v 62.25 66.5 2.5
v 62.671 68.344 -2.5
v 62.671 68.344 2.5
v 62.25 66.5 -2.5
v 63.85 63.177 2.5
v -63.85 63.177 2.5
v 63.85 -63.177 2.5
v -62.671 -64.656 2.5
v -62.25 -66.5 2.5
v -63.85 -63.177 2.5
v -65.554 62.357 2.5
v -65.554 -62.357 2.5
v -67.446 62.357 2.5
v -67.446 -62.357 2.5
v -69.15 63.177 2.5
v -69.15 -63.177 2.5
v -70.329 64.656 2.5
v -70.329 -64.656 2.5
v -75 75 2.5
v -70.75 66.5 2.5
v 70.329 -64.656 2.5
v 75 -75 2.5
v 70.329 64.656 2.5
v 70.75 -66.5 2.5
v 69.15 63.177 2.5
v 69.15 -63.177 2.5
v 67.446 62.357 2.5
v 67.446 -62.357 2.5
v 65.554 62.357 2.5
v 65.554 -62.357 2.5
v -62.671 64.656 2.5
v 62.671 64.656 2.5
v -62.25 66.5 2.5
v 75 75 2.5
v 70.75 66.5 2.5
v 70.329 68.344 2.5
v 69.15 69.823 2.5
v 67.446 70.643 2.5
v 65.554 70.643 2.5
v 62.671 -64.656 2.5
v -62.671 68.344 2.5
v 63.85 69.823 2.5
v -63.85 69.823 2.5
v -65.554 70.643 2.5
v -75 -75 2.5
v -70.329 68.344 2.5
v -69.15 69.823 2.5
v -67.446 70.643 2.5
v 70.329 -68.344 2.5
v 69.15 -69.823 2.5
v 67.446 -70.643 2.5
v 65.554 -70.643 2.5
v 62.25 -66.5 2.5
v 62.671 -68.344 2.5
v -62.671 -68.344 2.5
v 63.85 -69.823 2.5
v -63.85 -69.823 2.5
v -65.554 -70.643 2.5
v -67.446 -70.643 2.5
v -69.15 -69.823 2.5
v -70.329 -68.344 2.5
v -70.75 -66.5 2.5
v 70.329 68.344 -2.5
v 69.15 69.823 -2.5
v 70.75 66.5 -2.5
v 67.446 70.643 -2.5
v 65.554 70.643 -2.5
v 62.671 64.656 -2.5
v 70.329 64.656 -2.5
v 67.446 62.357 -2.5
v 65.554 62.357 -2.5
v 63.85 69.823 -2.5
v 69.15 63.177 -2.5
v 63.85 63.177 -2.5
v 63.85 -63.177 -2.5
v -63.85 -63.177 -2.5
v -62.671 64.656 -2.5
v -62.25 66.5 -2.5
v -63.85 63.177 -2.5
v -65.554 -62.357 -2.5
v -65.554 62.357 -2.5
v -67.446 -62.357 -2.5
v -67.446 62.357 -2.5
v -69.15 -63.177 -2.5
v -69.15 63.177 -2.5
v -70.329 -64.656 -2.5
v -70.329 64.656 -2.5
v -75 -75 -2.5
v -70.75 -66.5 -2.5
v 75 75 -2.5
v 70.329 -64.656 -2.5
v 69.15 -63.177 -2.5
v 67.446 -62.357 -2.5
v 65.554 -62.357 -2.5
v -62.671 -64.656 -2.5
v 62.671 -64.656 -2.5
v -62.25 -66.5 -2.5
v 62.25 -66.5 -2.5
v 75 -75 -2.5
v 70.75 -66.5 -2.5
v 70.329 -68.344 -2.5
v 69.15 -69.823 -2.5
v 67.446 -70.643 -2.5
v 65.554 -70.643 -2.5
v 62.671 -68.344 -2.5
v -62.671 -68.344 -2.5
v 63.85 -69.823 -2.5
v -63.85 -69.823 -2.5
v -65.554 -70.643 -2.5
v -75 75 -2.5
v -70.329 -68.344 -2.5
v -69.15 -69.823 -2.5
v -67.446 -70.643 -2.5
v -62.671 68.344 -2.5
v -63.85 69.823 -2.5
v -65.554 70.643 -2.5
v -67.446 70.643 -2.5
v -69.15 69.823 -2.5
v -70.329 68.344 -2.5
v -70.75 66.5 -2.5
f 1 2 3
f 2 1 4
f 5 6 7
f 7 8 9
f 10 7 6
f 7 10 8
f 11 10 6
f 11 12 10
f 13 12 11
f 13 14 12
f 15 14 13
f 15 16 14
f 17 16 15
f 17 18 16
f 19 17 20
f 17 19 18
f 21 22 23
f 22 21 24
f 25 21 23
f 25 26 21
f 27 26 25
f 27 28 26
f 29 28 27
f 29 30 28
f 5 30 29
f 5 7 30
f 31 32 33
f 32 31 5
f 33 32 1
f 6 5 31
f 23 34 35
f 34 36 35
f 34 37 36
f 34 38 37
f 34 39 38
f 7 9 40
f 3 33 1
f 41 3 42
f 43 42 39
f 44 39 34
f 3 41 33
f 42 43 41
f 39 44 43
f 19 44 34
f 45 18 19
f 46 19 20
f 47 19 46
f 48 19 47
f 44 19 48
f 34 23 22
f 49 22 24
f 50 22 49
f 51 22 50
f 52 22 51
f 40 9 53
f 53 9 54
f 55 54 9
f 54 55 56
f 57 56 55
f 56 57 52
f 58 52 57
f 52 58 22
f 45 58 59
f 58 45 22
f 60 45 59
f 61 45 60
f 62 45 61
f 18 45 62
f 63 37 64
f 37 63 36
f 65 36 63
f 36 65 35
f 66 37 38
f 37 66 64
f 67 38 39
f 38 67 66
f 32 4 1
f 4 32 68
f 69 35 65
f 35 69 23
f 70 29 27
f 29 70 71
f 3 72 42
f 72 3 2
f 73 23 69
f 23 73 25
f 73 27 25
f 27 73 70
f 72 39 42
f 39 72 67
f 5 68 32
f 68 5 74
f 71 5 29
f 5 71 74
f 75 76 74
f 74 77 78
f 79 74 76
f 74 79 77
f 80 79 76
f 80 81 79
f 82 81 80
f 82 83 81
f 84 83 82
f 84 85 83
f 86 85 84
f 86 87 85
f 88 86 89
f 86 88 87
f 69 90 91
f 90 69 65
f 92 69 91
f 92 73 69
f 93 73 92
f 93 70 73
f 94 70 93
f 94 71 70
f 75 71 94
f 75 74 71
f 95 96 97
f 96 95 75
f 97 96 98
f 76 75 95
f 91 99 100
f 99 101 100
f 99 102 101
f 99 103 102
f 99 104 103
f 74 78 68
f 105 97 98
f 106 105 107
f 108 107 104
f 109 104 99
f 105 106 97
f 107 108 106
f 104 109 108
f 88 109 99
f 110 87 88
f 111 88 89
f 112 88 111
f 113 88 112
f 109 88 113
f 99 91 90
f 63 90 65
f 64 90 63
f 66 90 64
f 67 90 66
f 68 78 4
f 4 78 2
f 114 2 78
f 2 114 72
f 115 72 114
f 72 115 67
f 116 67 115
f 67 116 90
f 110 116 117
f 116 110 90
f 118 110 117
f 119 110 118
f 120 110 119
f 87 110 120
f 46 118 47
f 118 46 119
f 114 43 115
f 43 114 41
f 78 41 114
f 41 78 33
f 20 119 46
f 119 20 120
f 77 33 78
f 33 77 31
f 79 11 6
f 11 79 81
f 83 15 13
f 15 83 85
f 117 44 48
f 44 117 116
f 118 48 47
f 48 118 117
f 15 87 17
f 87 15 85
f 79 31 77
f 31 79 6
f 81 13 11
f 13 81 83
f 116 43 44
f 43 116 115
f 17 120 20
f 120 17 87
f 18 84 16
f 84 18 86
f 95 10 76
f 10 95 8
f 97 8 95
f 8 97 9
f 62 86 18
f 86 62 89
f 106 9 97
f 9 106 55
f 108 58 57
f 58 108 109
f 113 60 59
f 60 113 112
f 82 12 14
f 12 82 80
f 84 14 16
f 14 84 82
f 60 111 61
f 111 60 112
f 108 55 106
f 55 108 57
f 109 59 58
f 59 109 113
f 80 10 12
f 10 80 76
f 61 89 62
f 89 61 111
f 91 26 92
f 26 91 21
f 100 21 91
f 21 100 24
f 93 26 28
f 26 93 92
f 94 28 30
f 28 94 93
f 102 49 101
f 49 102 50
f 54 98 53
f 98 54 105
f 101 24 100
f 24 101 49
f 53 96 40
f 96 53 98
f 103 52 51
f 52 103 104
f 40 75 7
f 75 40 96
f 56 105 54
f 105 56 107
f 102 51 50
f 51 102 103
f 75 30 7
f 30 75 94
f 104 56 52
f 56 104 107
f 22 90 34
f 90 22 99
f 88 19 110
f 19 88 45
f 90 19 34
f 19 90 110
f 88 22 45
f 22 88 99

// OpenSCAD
// Generated by SolidPython 1.1.3 on 2024-05-08 19:40:10


difference() {
	cube(center = true, size = [150, 150, 5]);
	union() {
		translate(v = [66.5000000000, 66.5000000000]) {
			cylinder(center = true, h = 5, r = 4.2500000000);
		}
		translate(v = [-66.5000000000, 66.5000000000]) {
			cylinder(center = true, h = 5, r = 4.2500000000);
		}
		translate(v = [-66.5000000000, -66.5000000000]) {
			cylinder(center = true, h = 5, r = 4.2500000000);
		}
		translate(v = [66.5000000000, -66.5000000000]) {
			cylinder(center = true, h = 5, r = 4.2500000000);
		}
	}
}
/***********************************************
*********      SolidPython code:      **********
************************************************
 
import solid
import numpy as np
import numbers
import pudb
from solid.utils import *
import viewscad
import subprocess
import os
import os.path as osp
import math
import sys

chamfer_extrude=solid.import_scad("./chamfer_extrude.scad")
chamfer_extrude=chamfer_extrude.chamfer_extrude
r = viewscad.Renderer(width=800, height=800)

def debug(model,f_name,path="/home/ts/code/projects/mfd/designs/debug"):
    solid.scad_render_to_file(model,osp.join(path,f_name)+".scad")
#generate position list of wells using offset from center
wells_pos_from_center_4 = lambda offset: [[-offset,offset],
                                        [offset, offset],
                                        [-offset, -offset],
                                        [offset, -offset]]
wells_pos_from_center_2 = lambda offset: [[offset,0],
                                        [-offset,0]]

def make_well(dims,shape=None,height=None,dxf=False):
    def circle_cylinder():
        if dxf or (height is None):
            well = solid.circle(r=dims, segments=64)
        else:
            well = solid.cylinder(r=dims, h=height, segments=64, center = True)
        return well
    if dims is None:
        sys.exit("radius needs to be a number")
    if isinstance(dims, numbers.Number):
        well =circle_cylinder()
    elif len(dims)==1:
        if isinstance(dims[1], numbers.Number):
            well =circle_cylinder()
        else:
            sys.exit("radius needs to be a number")
    elif len(dims)==2:
        well = solid.square(dims,center = True)
    elif len(dims)==3:
        well = solid.cube(dims, center = True)
    return well

def wells_top_bottom(center_gap,device_dims=None,shape=None,height=None, positions = None, dxf = False,well_shape=None):
    if well_shape == None:
        well_shape = make_well(device_dims,shape=shape,height=height,dxf=dxf)
    wells = []
    if positions is None:
        offset = radius+radius/2.0
        positions = wells_pos_from_center_2(offset)
    if dxf or (height is None):
        height = 0
    for position in positions:
        if dxf:
            wells.append(solid.translate([position[0],position[1]])(well_shape))
        else:
            wells.append(solid.translate([position[0],position[1],height/2.0])(well_shape))
    return  union()(*wells)

#place wells in four corners 
def four_corner(radius,height=None, positions = None, dxf = False):
    #if well pos not specified set
    #to equally spaced by half radius
    if positions is None:
        offset = radius+radius/2.0
        positions = wells_pos_from_center_4(offset)
    if dxf or (height is None):
        height = 0
    #make wells at positions with specified radius and height
    wells = []
    for position in positions:
        #make circle if making dxf
        if dxf:
            well_shape = solid.circle(r=radius, segments=64)
            well_shape = solid.translate([position[0],position[1]])(well_shape)
        #if stl make cylinder
        else:
            well_shape = solid.cylinder(r=radius, h=height, segments=64, center = True)
            well_shape = solid.translate([position[0],position[1],height/2.0])(well_shape)
        wells.append(well_shape)
    return  union()(*wells)

#generate channels 
def make_channels(length,width,height=0,num_chans=1,max_chans=None,spacing=None, dxf = False,
                  rotate_channels=False):
    if dxf or (height is None):
        height = 0
    #if channel gap not defined, is equal to
    if spacing is None: spacing = width
    #calculate number of channels if fitting max num within given width
    if not max_chans is None:
        import math
        num_chans = math.floor((max_chans-spacing)/(width+spacing))
    #get total width of channel section  
    total_width = (width*num_chans)+(spacing*(num_chans-1))

    #make template channel
    #if rotate_channels: width, length = length, width
    if dxf:
        channel_t = solid.square([length,width],center = True)
    else:
        channel_t = solid.cube([length,width,height], center = True)

    #if number channels is even, offset the first channel to center its gap
    if num_chans % 2 == 0: centering = -(width/2.0+spacing/2.0)
    else: centering = 0
    #move template channel up to align bottom at z = 0 
    #and offset center if necessary
    if dxf:
        channel_t = solid.translate([0,centering])(channel_t)
    else:
        channel_t = solid.translate([0,centering,height/2.0])(channel_t)

    #if rotate_channels: length,width = width,length
    #start making the channels
    channels = []
    for i in range(num_chans):
        #if i=0 there is no translation
        #if i=1, we make the first channel adjacent to second
        direction = i

        #if i>=1, we add channels alternating left and right
        if i >= 1:
            direction = -(i/2.0)
            if i % 2 == 1: direction = (-direction)+0.5
                
        #make channel at right position and add it to channel list
        translation_coords = [0,direction*(width+spacing)]
        #if rotate_channels: translation_coords = [direction*(width+spacing),0]
        if dxf:
            channel = solid.translate(translation_coords)(channel_t)
        else:
            channel = solid.translate([*translation_coords,0])(channel_t)
        channels.append(channel)
    
    #group all channels as one object
    channels = union()(*channels)
    #compute the x,y,z dimensions in order to pass as arguments 
    #for construction of other parts of device (such as the chambers)
    measurements = {'x':(length/2.0,-length/2.0),
                    'y':(total_width/2.0,-total_width/2.0)}
    if not dxf:
        measurements['z'] = (height,0)
    if rotate_channels:
        channels = solid.rotate(90)(channels)
        measurements['x'],measurements['y']=measurements['y'],measurements['x']
    return channels,measurements

def make_chambers(msrs,height=None,extra=0,len_until=None,width=None, dxf = False):
    #computes x,y,z length
    total = lambda x : abs(x[0]) + abs(x[1])
    
    #if specific height if specified
    #otherwise use same height as channels
    if dxf:
        pass
    elif not height is None:
        msrs['z'] = (height,0)
    else:
        msrs['z'] = (0,0)
        
    #make copy of measurements from channels to modify chamber dimensions 
    #and add length to chambers as specified
    chamber_dims = msrs.copy()
    #calculate length of chamber to reach specified offset
    if not len_until is None:
        chamber_len = len_until-(msrs['x'][0])
    #or add specified length to channel length (if not specified, adds 0)
    else:
        chamber_len = msrs['x'][0]+extra
    #set the chamber length based 
    chamber_dims['x'] = (chamber_len/2.0,-(chamber_len/2.0))
    #compute final dimensions of chamber
    if not width is None:
        chamber_dims['y'] = (width/2.0,-width/2.0)
    chamber_dims = [total(size) for size in chamber_dims.values()]
        
    #calculate chamber translation offset to place adjacent to channels
    chamber_trslt = msrs['x'][0]+(chamber_len/2.0)
    #compute chamber translation coordinates to align with channels
    #x = 1 moves chamber above channels
    #x = -1 moves chamber below channels
    if dxf:
        trslt = lambda x : [x*(chamber_trslt),0]
    else:
        trslt = lambda x : [x*(chamber_trslt),0,msrs['z'][0]/2.0]
    
    #function to make chamber at top or at bottom 
    if dxf:
        move = lambda x : solid.translate(trslt(x))(solid.square(chamber_dims, center = True) )
    else:
        move = lambda x : solid.translate(trslt(x))(solid.cube(chamber_dims,center = True))
    #make top and bottom chambers and return them as grouped
    top = move(1)
    bottom = move(-1)
    #chambers=solid.rotate(90)(solid.union()(top,bottom))
    chambers=(solid.union()(top,bottom))

    return chambers

#create alignment features 
def alignment_features(unit,dims,grid_size, mask_size = None, alignment = "hollow", units_from_center = (2.5,2.5), corner_len=None):
    width = grid_size[0]*dims[0]
    length = grid_size[1]*dims[1]
    if mask_size is None and corner_len is None:
        corner_len = (dims[0] + dims[1]) /2 / 8
    corner = lambda thickness_div : solid.union()( solid.square([corner_len,corner_len/thickness_div],center=False), solid.square([corner_len/thickness_div,corner_len],center=False) )
    
    def make_full(thickness_div):
        thickness = corner_len/thickness_div
        tr = solid.translate([0, 0, 0 ])(solid.rotate(180)(corner(thickness_div)))
        tr = solid.translate([thickness/2,thickness/2,0])(tr)
        bl = solid.translate([0, 0, 0 ])(solid.rotate(0)(corner(thickness_div)))
        bl = solid.translate([-thickness/2,-thickness/2,0])(bl)
        return solid.union()(tr,bl)
    
    def make_hollow(thickness_div):
        thickness = corner_len/(thickness_div/2)
        inner = make_full(thickness_div)
        outer = make_full(thickness_div/2)
        hollow = outer - inner 
        return hollow
    
    center = (width /2 , length/2)
    mask_pos = lambda x,y : (center[0] + x*(float(units_from_center[0])*dims[0]), center[1] + y*(float(units_from_center[1])*dims[1]))
    positions = []
    positions.append(mask_pos(1,0))
    positions.append(mask_pos(0,1))
    positions.append(mask_pos(-1,0))
    positions.append(mask_pos(0,-1))
    make_mask = lambda mtype : make_hollow(8) if mtype == "hollow" else make_full(8)
    masks = [ solid.translate([*position,0])(make_mask(alignment)) for position in positions]
    
    solid.scad_render_to_file(solid.union()(*masks),"./designs/open_chamber/masks.scad")
    #return unit - solid.union()(*masks)
    return solid.union()(*masks,unit)

def create_outline(thickness, array, dims, grid_size,):
    width = grid_size[0]*dims[0] + thickness *2
    length = grid_size[1]*dims[1] + thickness *2
    outer = solid.translate([-thickness, -thickness,0])(solid.square([width, length]))
    return outer-array

def create_wall(wall_thickness, outline_thickness, dims, grid_size, wall_height = 2000, dxf = False):
    inner_width = grid_size[0]*dims[0] + outline_thickness *2
    inner_length = grid_size[1]*dims[1] + outline_thickness *2
    outer_width = inner_width + wall_thickness * 2
    outer_length = inner_length + wall_thickness * 2
    outer_pos_x = -outline_thickness-wall_thickness
    outer_pos_y = -outline_thickness-wall_thickness
    inner_pos_x = -outline_thickness
    inner_pos_y = -outline_thickness
    if dxf:
        inner_wall = solid.translate([inner_pos_x,
                                      inner_pos_y,
                                      0])(solid.square([inner_width, inner_length]))
        outer_wall = solid.translate([outer_pos_x,
                                      outer_pos_y,
                                      0])(solid.square([outer_width, outer_length]))

        return outer_wall-inner_wall
    else:
        inner_wall = solid.translate([inner_pos_x,
                                      inner_pos_y,
                                      0])(solid.cube([inner_width, inner_length,wall_height]))
        outer_wall = solid.translate([outer_pos_x,
                                      outer_pos_y,
                                      0])(solid.cube([outer_width, outer_length,wall_height]))

        return outer_wall-inner_wall, {'wall_height': wall_height,
                                       'wall_thickness': wall_thickness,
                                       'inner_width':inner_width,
                                       'inner_length': inner_length,
                                       'outer_width': outer_width,
                                       'outer_length': outer_length,
                                       'outer_pos_x' : outer_pos_x,
                                       'outer_pos_y' : outer_pos_y,
                                       'inner_pos_x' : inner_pos_x,
                                       'inner_pos_y' : inner_pos_y}

def create_thicker_wall(wall_thickness, outer_wall_offset, wall_dims, dims, grid_size, height_start = .2, height_end=2, dxf = False):
    addon_wall,thicker_wall_dims = create_wall(wall_thickness, outer_wall_offset, dims, grid_size, wall_height=height_end-height_start, dxf = False)
    addon_wall = solid.translate([0,0,height_start])(addon_wall)

    thicker_wall_dims['wall_height'] = height_end
    thicker_wall_dims['wall_thickness'] = wall_dims['wall_thickness'] + wall_thickness
    return addon_wall, thicker_wall_dims
 
def add_lock_to_wall(wall,wall_dims,y_offset = 0,cut_ratio=0.7,L_length=3, gap_ratio=0.05, axis="x",width_ratio=1/2):
    # Makes L shape
    def make_L(max_length,length_thickness,max_width,width_thickness,height,y_offset):
        length = solid.cube([max_length,length_thickness,height])
        width = solid.cube([width_thickness,max_width,height])
        width = solid.translate([max_length-(width_thickness),0,0])(width)
        L = solid.union()(width,length)
        debug(L,"L")
        if axis == "x":
            L = solid.rotate(-90)(L)
            L = solid.translate([0,max_length,0])(L)
        else:
            L = solid.rotate(-180)(L)
            L = solid.translate([max_length,max_width,0])(L)
        return solid.translate([0,0,y_offset])(L)
    
    lock_length = L_length
    lock_width = wall_dims['wall_thickness']*width_ratio
    lock_length_thickness = lock_width/2
    lock_width_thickness = lock_width/2
    L_lock = make_L(lock_length,lock_length_thickness,lock_width,lock_width_thickness, wall_dims['wall_height']-y_offset, y_offset)
    
    margin_space = lock_length - lock_length*(1-gap_ratio)
    key_length = lock_length-margin_space
    key_length_thickness = lock_length_thickness-(margin_space*2)
    key_width = lock_width-(margin_space*2)
    key_width_thickness = lock_width_thickness-(margin_space*2)
    L_key = make_L(key_length,key_length_thickness,key_width,key_width_thickness, wall_dims['wall_height']-y_offset, y_offset)
    L_key = solid.translate([margin_space,margin_space,0])(L_key)
    L = solid.union()(L_lock,L_key)
    debug(L,"L")
    
    #Make cube to be used as negative to split frame in a half
    #Can choose if making left or right negative, specify ratio of split
    def make_negative(right,cut_ratio):
        if axis == "x":
            if right:
                length = wall_dims['outer_length']*(1-cut_ratio)
                pos_x = wall_dims['outer_pos_x']+(wall_dims['outer_length']*cut_ratio)
            else:
                length = wall_dims['outer_length']*(cut_ratio)
                pos_x = wall_dims['outer_pos_x'] 
            negative = solid.cube([wall_dims['outer_width'],length, wall_dims['wall_height']])
            negative = solid.translate([wall_dims['outer_pos_y'],pos_x,0])(negative)
        else:
            if right:
                length = wall_dims['outer_width']*(1-cut_ratio)
                pos_x = wall_dims['outer_pos_y']+(wall_dims['outer_width']*cut_ratio)
            else:
                length = wall_dims['outer_width']*(cut_ratio)
                pos_x = wall_dims['outer_pos_y'] 
            negative = solid.cube([length,wall_dims['outer_length'], wall_dims['wall_height']])
            negative = solid.translate([pos_x,wall_dims['outer_pos_x'],0])(negative)
        return negative, pos_x, length 
                      
    #Make negatives
    negative_right, right_half_pos_x, right_half_length = make_negative(True,cut_ratio)
    negative_left, left_half_pos_x, right_half_length = make_negative(False,cut_ratio)
    #Make halves
    left_half = solid.difference()(wall,negative_right)
    right_half = solid.difference()(wall,negative_left)
    def place_L(L, L_length,L_width):
        #Place L on top wall       
        offset_to_center = (wall_dims['wall_thickness']-L_width)/2
        if axis == "x":
            y_pos_top = (wall_dims['outer_pos_y'] +
                    wall_dims['outer_width'] - 
                    L_width - offset_to_center)
            top_L = solid.translate([y_pos_top,
                                     right_half_pos_x-(L_length),
                                     0])(L)
            #Place L on bottom wall       
            y_pos_bottom = wall_dims['outer_pos_y']+offset_to_center
            bottom_L = solid.translate([y_pos_bottom,
                                        right_half_pos_x-L_length,
                                        0])(L)
        else:
            y_pos_top = (wall_dims['outer_pos_x'] +
                    wall_dims['outer_length'] -
                    (L_width+offset_to_center))
            top_L = solid.translate([right_half_pos_x-L_length,
                                     y_pos_top,
                                     0])(L)
            #Place L on bottom wall       
            y_pos_bottom = wall_dims['outer_pos_y']+offset_to_center
            bottom_L = solid.translate([right_half_pos_x-L_length,
                                        y_pos_bottom,
                                        0])(L)
        return bottom_L, top_L
    #Make complimentary L pieces through union and differences
    #Make Lock
    bottom_L_lock, top_L_lock = place_L(L_lock,L_length,lock_width)
    left_half = solid.difference()(left_half,bottom_L_lock)
    left_half = solid.difference()(left_half,top_L_lock)
    #Make Key
    bottom_L_key, top_L_key = place_L(L_key,L_length,lock_width)
    right_half = solid.union()(right_half,bottom_L_key)
    right_half = solid.union()(right_half,top_L_key)
    return left_half, right_half


#build a row x col grid of containment units
def make_unit_array(unit,dims,grid_size, dxf = False, alignment = None, mask_size = None,
                    units_from_center = None,alignment_offset=None, alignment_mark_size=1):
    units = []
    for col in range(grid_size[1]):
        for row in range(grid_size[0]):
            if dxf:
                units.append(solid.translate([row*dims[0],col*dims[1]])(unit))
            else:
                units.append(solid.translate([row*dims[0],col*dims[1],dims[2]/2.0])(unit))
    array = solid.union()(*units)
    if (not alignment is None) and dxf:
        if not alignment_offset is None:
            array = solid.translate([alignment_offset[0],alignment_offset[1]])(array)
        array = alignment_features(array,dims, grid_size, alignment = alignment, mask_size = None, units_from_center = units_from_center,corner_len=alignment_mark_size)
        if not alignment_offset is None:
            array = solid.translate([-alignment_offset[0],-alignment_offset[1]])(array)
    return array


def make_taylor(wells_pos = wells_pos_from_center_4(2.25), well_rad = 1.5 ,
                well_height = 2, chan_w = 0.01, chan_l = 1, chan_h = 0.010 ,
                chan_gap = 0.040, max_chans = None,num_chans=100, chamber_height  = 0.100,
                columns = 1, rows = 1, chamber_len_until=2.25, add_channels = True, add_wells = True, 
                add_chambers = True, save_path = "./", alignment = None, units_from_center = 2,
                mask_size = None, render_stl = False, outline_thickness = 0.050, dxf = True,
                wall_height = 15, wall_thickness = 0.95, casing_x=9, casing_y=9, casing_z=0,rotate_units=0):

    dims = [casing_x, casing_y, casing_z]
    wells = four_corner(well_rad,well_height, dxf = dxf, positions = wells_pos)
    debug(wells,"wells")
    channels, msrs = make_channels(chan_l,chan_w,chan_h,dxf=dxf, spacing = chan_gap, max_chans=max_chans,num_chans=num_chans)
    debug(channels,"channels")
    chambers = make_chambers(msrs,dxf = dxf, height=chamber_height,len_until=chamber_len_until)
    debug(chambers,"chambers")

    #add together and render
    device_parts = []
    if add_channels:
        device_parts.append(channels)
    if add_wells:
        device_parts.append(wells)
    if add_chambers:
        device_parts.append(chambers)
    device=union()(*device_parts)
    device = rotate(rotate_units)(device)

    device=solid.translate([dims[0]/2.0,dims[1]/2.0,0])(device)
    channels = rotate(rotate_units)(channels)
    channels=solid.translate([dims[0]/2,dims[1]/2,0])(channels)
    chambers_wells = union()(wells,chambers)
    chambers_wells = rotate(rotate_units)(chambers_wells)
    chambers_wells=solid.translate([dims[0]/2,dims[1]/2,0])(chambers_wells)

    file_name = str(rows)+'x'+str(columns)+'_units_'
    grid_size = [rows,columns]

    if alignment:
        alignment="full"
    device = make_unit_array(device,dims,grid_size, dxf=dxf, alignment = alignment,
                                 units_from_center = units_from_center)
    channels = make_unit_array(channels,dims,grid_size, dxf=dxf, alignment = alignment,
                                 units_from_center = units_from_center)
    if alignment=="full":
        alignment="hollow"

    chambers_wells = make_unit_array(chambers_wells,dims,grid_size, dxf=dxf, alignment = alignment,
                                 units_from_center =units_from_center)

    def save_model(model,prefix):
        model_fname = os.path.abspath(save_path+prefix+"_"+file_name+".scad")
        solid.scad_render_to_file(model,model_fname)
        return model_fname

    wells_fname = save_model(wells,"wells")
    channels_fname = save_model(channels,"channels")
    device_fname = save_model(device,"device")
    chambers_wells_fname = save_model(chambers_wells,"chambers_wells")
    return (chambers_wells,chambers_wells_fname), (channels,channels_fname), (device,device_fname)

def make_device(design='open',rows=8,columns=6,wells_pos = 4.5,well_offset=3.2, well_rad=3.2,well_height=0.1,
                chan_l=1,chan_w=0.01,chan_h=0.01,chan_gap=0.015,num_chans=101,dxf=True,save_path="./designs/open_chamber/",
                casing_x=9.0,casing_y=18.0,casing_z=0,rotate_units=90,units_from_center=(3,1),chamber_len_until=4.5,
                chamber_width=None,alignment=True, add_wells=True, add_channels=True,add_chambers=True,well_shape=None):

    dims = [casing_x, casing_y, casing_z]
    if design == "open":
        wells_pos=wells_pos_from_center_2(wells_pos)
        wells = wells_top_bottom(well_offset*2,device_dims=well_rad,height=well_height, dxf = dxf, positions = wells_pos,well_shape=well_shape)
    elif design == "closed":
        wells_pos=wells_pos_from_center_4(wells_pos)
        debug(wells,"wells")
        wells = four_corner(well_offset,well_height,device_dims=well_rad, dxf = dxf, positions = wells_pos)
    else:
        print(design+" is not a valid design.\n Choose valid design: 'open' or 'closed'")
        exit()
    wells = rotate(rotate_units)(wells)
    wells=solid.translate([dims[0]/2,dims[1]/2,0])(wells)
    debug(wells,"wells")

    channels, msrs = make_channels(chan_l,chan_w,chan_h,dxf=dxf, spacing = chan_gap, num_chans=num_chans,rotate_channels=False)
    channels = rotate(rotate_units)(channels)
    channels=solid.translate([dims[0]/2,dims[1]/2,0])(channels)

    chambers=make_chambers(msrs,height=None,extra=0,len_until=chamber_len_until, width=chamber_width,dxf = dxf)
    chambers = rotate(rotate_units)(chambers)
    chambers=solid.translate([dims[0]/2,dims[1]/2,0])(chambers)

    device_parts = []
    if add_channels:
        device_parts.append(channels)
    if add_wells:
        device_parts.append(wells)
    if add_chambers:
        device_parts.append(chambers)
    device = union()(*device_parts)
    #device = rotate(rotate_units)(device)
    #device=solid.translate([dims[0]/2.0,dims[1]/2.0,0])(device)

    chambers_wells = []
    if add_chambers:
        chambers_wells.append(chambers)
    if add_wells:
        chambers_wells.append(wells)
    chambers_wells = union()(*chambers_wells)
    #chambers_wells = union()(wells,chambers)
    #chambers_wells = rotate(rotate_units)(chambers_wells)
    #chambers_wells=solid.translate([dims[0]/2,dims[1]/2,0])(chambers_wells)

    file_name = str(rows)+'x'+str(columns)+'_units_'

    grid_size = [rows,columns]
    if alignment:
        alignment="full"
    device = make_unit_array(device,dims,grid_size, dxf=dxf, alignment = alignment,
                                 units_from_center = units_from_center)
    channels = make_unit_array(channels,dims,grid_size, dxf=dxf, alignment = alignment,
                                 units_from_center = units_from_center)
    if alignment=="full":
        alignment="hollow"

    chambers_wells = make_unit_array(chambers_wells,dims,grid_size, dxf=dxf, alignment = alignment,
                                 units_from_center =units_from_center)

    def save_model(model,prefix):
        model_fname = os.path.abspath(save_path+prefix+"_"+file_name+".scad")
        solid.scad_render_to_file(model,model_fname)
        return model_fname

    wells_fname = save_model(wells,"wells")
    channels_fname = save_model(channels,"channels")
    device_fname = save_model(device,"device")
    chambers_wells_fname = save_model(chambers_wells,"chambers_wells")
    return (chambers_wells,chambers_wells_fname), (channels,channels_fname), (device,device_fname)


def make_open_chamber(rows=8,columns=6,wells_pos = wells_pos_from_center_2(4.5), well_rad=3.2,well_height=0.1,
                      chan_l=1,chan_w=0.01,chan_h=0.01,chan_gap=0.015,num_chans=101,dxf=True,save_path="./designs/open_chamber/",
                      casing_x=9.0,casing_y=18.0,casing_z=0,rotate_units=90,units_from_center=(3,1),chamber_len_until=4.5,
                      chamber_width=None,alignment=True, add_wells=True, add_channels=True,add_chambers=True,well_shape=None):

    dims = [casing_x, casing_y, casing_z]
    wells = wells_top_bottom(well_rad,height=well_height, dxf = dxf, positions = wells_pos, well_shape=well_shape)
    channels, msrs = make_channels(chan_l,chan_w,chan_h,dxf=dxf, spacing = chan_gap, num_chans=num_chans,rotate_channels=False)
    chambers=make_chambers(msrs,height=None,extra=0,len_until=chamber_len_until, width=chamber_width,dxf = dxf)
    debug(chambers,"chambers")
    device_parts = []
    if add_channels:
        device_parts.append(channels)
    if add_wells:
        device_parts.append(wells)
    if add_chambers:
        device_parts.append(chambers)
    device = union()(*device_parts)
    device = rotate(rotate_units)(device)
    device=solid.translate([dims[0]/2.0,dims[1]/2.0,0])(device)
    channels = rotate(rotate_units)(channels)
    channels=solid.translate([dims[0]/2,dims[1]/2,0])(channels)
    chambers_wells = union()(wells,chambers)
    chambers_wells = rotate(rotate_units)(chambers_wells)
    chambers_wells=solid.translate([dims[0]/2,dims[1]/2,0])(chambers_wells)

    file_name = str(rows)+'x'+str(columns)+'_units_'

    grid_size = [rows,columns]
    if alignment:
        alignment="full"
    device = make_unit_array(device,dims,grid_size, dxf=dxf, alignment = alignment,
                                 units_from_center = units_from_center)
    channels = make_unit_array(channels,dims,grid_size, dxf=dxf, alignment = alignment,
                                 units_from_center = units_from_center)
    if alignment=="full":
        alignment="hollow"

    chambers_wells = make_unit_array(chambers_wells,dims,grid_size, dxf=dxf, alignment = alignment,
                                 units_from_center =units_from_center)

    def save_model(model,prefix):
        model_fname = os.path.abspath(save_path+prefix+"_"+file_name+".scad")
        solid.scad_render_to_file(model,model_fname)
        return model_fname

    wells_fname = save_model(wells,"wells")
    channels_fname = save_model(channels,"channels")
    device_fname = save_model(device,"device")
    chambers_wells_fname = save_model(chambers_wells,"chambers_wells")
    return (chambers_wells,chambers_wells_fname), (channels,channels_fname), (device,device_fname)

def to_dxf(scad_path):
    dxf_path = scad_path.replace(".scad",".dxf")
    subprocess.call(["openscad", "-o", dxf_path, scad_path])
    import ezdxf
    temp_dxf = ezdxf.readfile(dxf_path)
    temp_dxf.saveas(dxf_path)

#def make_walls(diameter,thickness,grid_size,dims,height=20,segments=256,make_inner=True):
#    wafer_wall_out = solid.cylinder(r=diameter/2,h=height, segments=segments)
#    wafer_wall_in = solid.cylinder(r=(diameter/2-thickness),h=height, segments=segments)
#    wafer_wall = solid.difference()(wafer_wall_out,wafer_wall_in)
#    wafer_wall = solid.translate([grid_size[1]*dims[1]/2.0,grid_size[0]*dims[0]/2.0])(wafer_wall)
#
#    vertical_wall_length = grid_size[1]*dims[1]
#    horizontal_wall_length = grid_size[0]*dims[0]
#    vertical_wall = solid.cube([vertical_wall_length,thickness,height],center = True)
#    vertical_wall = solid.translate([vertical_wall_length/2,0,height/2])(vertical_wall)
#    horizontal_wall = solid.cube([thickness,horizontal_wall_length,height],center = True)
#    horizontal_wall = solid.translate([0,vertical_wall_length/2,height/2])(horizontal_wall)
#    walls = []
#    walls.append(horizontal_wall)
#    walls.append(vertical_wall)
#    for col in range(grid_size[1]):
#        if col == grid_size[1]-1: 
#            walls.append(solid.translate([0,(col+1)*dims[1]])(vertical_wall))
#        elif col > 0 and col < grid_size[1]-1 and make_inner==True:
#            walls.append(solid.translate([0,(col+1)*dims[1]])(vertical_wall))
#    for row in range(grid_size[0]):
#        if row == grid_size[0]-1: 
#            walls.append(solid.translate([(row+1)*dims[0],0])(horizontal_wall))
#        elif row > 0 and row < grid_size[0]-1 and make_inner==True:
#            walls.append(solid.translate([(row+1)*dims[0],0])(horizontal_wall))
#    walls = union()(*walls)
#    wafer_walls = union()(walls,wafer_wall)
#    return walls,wafer_wall,wafer_walls

def make_walls(diameter,thickness,grid_size,dims,height=20,segments=256,make_inner=True,padx=0,pady=0):
    wafer_wall_out = solid.cylinder(r=diameter/2,h=height, segments=segments)
    wafer_wall_in = solid.cylinder(r=(diameter/2-thickness),h=height, segments=segments)
    wafer_wall = solid.difference()(wafer_wall_out,wafer_wall_in)
    wafer_wall = solid.translate([grid_size[1]*dims[1]/2.0,grid_size[0]*dims[0]/2.0])(wafer_wall)

    vertical_wall_length = grid_size[0]*dims[0]+padx
    horizontal_wall_length = grid_size[1]*dims[1]+pady
    vertical_wall = solid.cube([vertical_wall_length,thickness,height],center = True)
    vertical_wall = solid.translate([vertical_wall_length/2-pady/2,-padx/2,height/2])(vertical_wall)
    horizontal_wall = solid.cube([thickness,horizontal_wall_length,height],center = True)
    horizontal_wall = solid.translate([-pady/2,horizontal_wall_length/2-padx/2,height/2])(horizontal_wall)
    walls = []
    walls.append(horizontal_wall)
    walls.append(vertical_wall)
    for col in range(grid_size[1]):
        if col == grid_size[1]-1: 
            walls.append(solid.translate([0,(col+1)*dims[1]+pady])(vertical_wall))
        elif col > 0 and col < grid_size[1]-1 and make_inner==True:
            walls.append(solid.translate([0,(col+1)*dims[1]])(vertical_wall))
    for row in range(grid_size[0]):
        if row == grid_size[0]-1: 
            walls.append(solid.translate([(row+1)*dims[0]+padx,0])(horizontal_wall))
        elif row > 0 and row < grid_size[0]-1 and make_inner==True:
            walls.append(solid.translate([(row+1)*dims[0],0])(horizontal_wall))
    walls = union()(*walls)
    wafer_walls = union()(walls,wafer_wall)
    return walls,wafer_wall,wafer_walls

def save_model(model,base_path,base_name,dxf=True):
    if not os.path.exists(base_path):
        os.makedirs(base_path)
    dxf_path=osp.join(base_path,base_name+".scad")
    solid.scad_render_to_file(model,osp.join(dxf_path))
    if dxf:
        to_dxf(dxf_path)

def make_wafer(diameter,flat_len,thickness):
    wafer = solid.cylinder(r1=diameter/2,r2=diameter/2,h=thickness,segments=512,)()
    x_start_flat=(flat_len/2)
    y_start_flat = math.sqrt(((diameter/2)**2) - (x_start_flat**2) )
    height_delete_flat=diameter/2-y_start_flat
    flat_delete = solid.cube([flat_len,height_delete_flat,thickness],center=False)()
    flat_delete = solid.translate([-flat_len/2,y_start_flat,0])(flat_delete)
    wafer = solid.difference()(wafer,flat_delete)
    wafer = solid.rotate(90)(wafer)
    return wafer

def add_wafer_to_mask(wafer_size,flat_len,mask,grid_size,dims,wafer_line_thickness=0.1,outer_mask_thickness=5,alignment_offset=None):
    def make_wafer_mask(wafer_size,flat_len):
        wafer_mask = make_wafer(wafer_size,flat_len,1)
        wafer_mask = solid.projection()(wafer_mask)
        wafer_mask = solid.translate([grid_size[0]*dims[0]/2.0,grid_size[1]*dims[1]/2.0])(wafer_mask)
        if not alignment_offset is None:
            wafer_mask = solid.translate([-alignment_offset[0],-alignment_offset[1]])(wafer_mask)
        return wafer_mask

    inner_wafer_line_mask = make_wafer_mask(wafer_size-wafer_line_thickness/2,flat_len)
    outer_wafer_line_mask = make_wafer_mask(wafer_size+wafer_line_thickness/2,flat_len)
    outer_wafer_mask = make_wafer_mask(wafer_size+outer_mask_thickness,flat_len)
    outer_wafer_mask = solid.difference()(outer_wafer_mask,outer_wafer_line_mask)
    wafer_mask = solid.union()(outer_wafer_mask,inner_wafer_line_mask)

    return solid.difference()(wafer_mask,mask)

def make_posts(post_shape,post_height):
    posts = solid.linear_extrude(height=post_height)(post_shape)
    return posts

def make_wafer_empty(diameter,flat_len,thickness,margin,notch_len=20,notch_height=5,oversize=1.01):
    diameter*=oversize
    flat_len*=oversize
    wafer = make_wafer(diameter,flat_len,thickness)
    holder = solid.cylinder(r1=diameter/2+margin,r2=diameter/2+margin,h=thickness,segments=512)()
    holder = solid.difference()(holder,wafer)

    x_start_flat=(flat_len/2)
    y_start_flat = math.sqrt(((diameter/2)**2) - (x_start_flat**2) )
    height_delete_flat=diameter/2-y_start_flat
    notch = solid.cube([notch_len,notch_height,thickness],center=False)()
    notch = solid.translate([-notch_len/2,y_start_flat,0])(notch)
    notch = solid.rotate(90)(notch)
    return solid.difference()(holder,notch)

def wafer_print_calibration(diameter,thickness,height,z_offset):
    circles = []
    radii = []
    radii.append(diameter/2.0*0.8)
    radii.append(diameter/2.0*0.6)
    radii.append(diameter/2.0*0.4)
    radii.append(diameter/2.0*0.2)
    for radius in radii:
        inner = solid.cylinder(r1=radius-(thickness/2.0),r2=radius-(thickness/2.0),h=thickness,segments=512,)()
        outer = solid.cylinder(r1=radius+(thickness/2.0),r2=radius+(thickness/2.0),h=thickness,segments=512,)()
        diff = solid.difference()(outer,inner)
        circles.append(diff)
    circles = solid.union()(*circles)
    circles = solid.translate([0,0,z_offset])(circles)
    return circles

def make_rack(wells,dims,grid_size,alignment_offset,rack_x,rack_y,rack_thickness,bolt_width,add_bolts=True):

    #get X and Y dimensions of gride of pipette tips
    X_len = dims[0]*grid_size[0]
    Y_len = dims[1]*grid_size[1]
    #make rack
    rack = solid.cube([rack_x,rack_y,rack_thickness],center=True)

    if add_bolts:
    #add bolt holes
        bolt_hole=solid.cylinder(r=bolt_width/2,h=rack_thickness,center=True)()
        bolt_holes = []
        bolt_holes.append(solid.translate([rack_x/2-1.5*bolt_width,rack_y/2-1.5*bolt_width])(bolt_hole))
        bolt_holes.append(solid.translate([-rack_x/2+1.5*bolt_width,rack_y/2-1.5*bolt_width])(bolt_hole))
        bolt_holes.append(solid.translate([-rack_x/2+1.5*bolt_width,-rack_y/2+1.5*bolt_width])(bolt_hole))
        bolt_holes.append(solid.translate([rack_x/2-1.5*bolt_width,-rack_y/2+1.5*bolt_width])(bolt_hole))
        bolt_holes = solid.union()(*bolt_holes)
        rack=solid.difference()(rack,bolt_holes)
    rack_support = rack

    #center rack with pipette holes
    rack = solid.translate([0,0,rack_thickness/2])(rack)
    rack = solid.translate([X_len/2,Y_len/2])(rack)
    rack = solid.translate([-alignment_offset[0],-alignment_offset[1]])(rack)
    wells = solid.linear_extrude(height=rack_thickness)(wells)
    rack = solid.difference()(rack,wells)
    return rack, rack_support

def make_pillar(wells,dims,grid_size,alignment_offset,rack_x,rack_y,pillar_height,rack_thickness,bolt_width,add_bolts=True,taper_angle=1,bolt_position_corner=1.5):

    #get X and Y dimensions of gride of pipette tips
    X_len = dims[0]*grid_size[0]
    Y_len = dims[1]*grid_size[1]
    #make rack
    rack = solid.cube([rack_x,rack_y,rack_thickness],center=True)
    
    if add_bolts:
    #add bolt holes
        bolt_hole=solid.cylinder(r=bolt_width/2,h=rack_thickness,center=True)()
        bolt_holes = []
        bolt_holes.append(solid.translate([rack_x/2-bolt_position_corner*bolt_width,rack_y/2-bolt_position_corner*bolt_width])(bolt_hole))
        bolt_holes.append(solid.translate([-rack_x/2+bolt_position_corner*bolt_width,rack_y/2-bolt_position_corner*bolt_width])(bolt_hole))
        bolt_holes.append(solid.translate([-rack_x/2+bolt_position_corner*bolt_width,-rack_y/2+bolt_position_corner*bolt_width])(bolt_hole))
        bolt_holes.append(solid.translate([rack_x/2-bolt_position_corner*bolt_width,-rack_y/2+bolt_position_corner*bolt_width])(bolt_hole))
        bolt_holes = solid.union()(*bolt_holes)
        rack=solid.difference()(rack,bolt_holes)
    rack_support = rack

    #center rack with pipette holes
    #rack = solid.translate([0,0,-rack_thickness])(rack)
    rack = solid.translate([X_len/2,Y_len/2])(rack)
    rack = solid.translate([-alignment_offset[0],-alignment_offset[1]])(rack)
    if not taper_angle == 0:
        wells=chamfer_extrude(pillar_height,taper_angle,segments=20)(wells)
    else:
        wells = solid.linear_extrude(height=pillar_height)(wells)
    rack = solid.union()(rack,wells)
    return rack, rack_support

def deg_taper_len(height,deg):
    if not deg == 0:
        return height*math.tan(math.radians(deg))
    else:
        return 0

def make_outline(inner_dims,wall_thickness,grid_size,dims,alignment_offset):
    inner_dims=np.array(inner_dims)
    inner_outline=solid.square(inner_dims,center=True)
    outer_dims=inner_dims+wall_thickness
    outer_outline=solid.square(outer_dims,center=True)
    outline=solid.difference()(outer_outline,inner_outline)
    outline=solid.translate([grid_size[0]*dims[0]/2.0,grid_size[1]*dims[1]/2.0])(outline)
    return outline








 
 
************************************************/
